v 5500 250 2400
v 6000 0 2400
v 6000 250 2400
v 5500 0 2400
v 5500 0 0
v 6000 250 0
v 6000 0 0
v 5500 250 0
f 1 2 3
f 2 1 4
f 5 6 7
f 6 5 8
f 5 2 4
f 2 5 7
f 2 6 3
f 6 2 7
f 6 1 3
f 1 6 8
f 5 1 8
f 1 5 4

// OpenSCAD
// file: tea_shop_parameters.scad
// =============================================================================
// Tea Shop — SHARED PARAMETERS (Base & Shell)
// -----------------------------------------------------------------------------
// OpenSCAD's native unit is 1 mm, so every value here is the REAL-LIFE size
// in millimetres (1000 mm = 1 m). E.g. building_width = 6000 means 6.0 m.
//
// For MLO / FiveM (which uses metres as 1 unit = 1 m), either:
//   (a) export each STL here and re-import at a scale of 0.001 (mm -> m), or
//   (b) model in metres directly by dividing every value below by 1000.
//
// Tune each value here; every module pulls its size from these variables.
// =============================================================================


// --- building shell / roof (lean-to: TALL back, SHORT front eave) -----------
wall_thickness    = 250;   // wall panel thickness                      (0.25 m)
building_width    = 6000;  // X extent, left wall -> right wall          (6.00 m)
building_depth    = 4000;  // Y extent, front eave -> back wall          (4.00 m)
back_height       = 3200;  // full wall height at the BACK (tall side)   (3.20 m)
front_eave_height = 2400;  // wall height at the FRONT eave (short side) (2.40 m)

// --- front wall openings (service window + door), measured along X ----------
left_pier_width   = 600;   // solid pier left of the service window      (0.60 m)
window_width      = 3400;  // service window opening width — made WIDE   (3.40 m)
mid_pier_width    = 500;   // solid pier between window and door         (0.50 m)
door_width        = 1000;  // door opening width                         (1.00 m)
sill_height       = 900;   // knee-wall (sill) height beneath the window (0.90 m)

// --- base slab / plinth ------------------------------------------------------
base_thickness    = 200;   // vertical thickness of the ground plinth    (0.20 m)
base_side_margin  = 900;   // slab overhang beyond left/right walls      (0.90 m)
base_back_margin  = 600;   // slab overhang behind the back wall         (0.60 m)
base_front_margin = 3000;  // extra slab in FRONT = porch/patio (pergola)(3.00 m)


// -----------------------------------------------------------------------------
// DERIVED DIMENSIONS (do not edit — computed from the values above)
// -----------------------------------------------------------------------------

// front-wall pier chain, left -> right, must sum exactly to building_width
window_left      = left_pier_width;                    // X where the window starts
window_right     = window_left + window_width;         // X where the window ends
door_left        = window_right + mid_pier_width;      // X where the door starts
door_right       = door_left + door_width;             // X where the door ends
right_pier_width = building_width - door_right;        // fills the rest to the corner

// window opening rises from the top of the sill up to the front eave line
window_open_height = front_eave_height - sill_height;
// file: tea_shop_modules.scad
// =============================================================================
// Tea Shop — MODULE LIBRARY (Base & Shell)
// -----------------------------------------------------------------------------
// This file only DEFINES the parts (and the assemble() preview). It instantiates
// NO geometry on its own, so it can be include'd by the individual export files
// (part_*.scad) and by tea_shop_assemble.scad without producing duplicates.
//
// GLOBAL COORDINATE SYSTEM (shared by every piece — no per-part centering):
//   +X -> left -> right  (building WIDTH along X, left wall at X=0)
//   +Y -> front -> back  (building DEPTH along Y, front eave at Y=0)
//   +Z -> up             (ground/porch surface = Z=0)
//
//   Building footprint = [0..building_width] x [0..building_depth].
//   Roof = single-pitch lean-to: TALL at BACK (Y=depth), SHORT at FRONT (Y=0).
// =============================================================================

include <tea_shop_parameters.scad>;


// -----------------------------------------------------------------------------
// _trapezoid_prism — shared core for the two side walls. It draws the side
// elevation (depth x height) as a 2D polygon, then linear_extrude +
// rotate([0,-90,0]) stand it up so its thickness runs along X. The front edge
// (Y=0) is the short eave height and the back edge (Y=depth) is the full back
// height, so the top edge automatically matches the roof pitch. Result
// occupies X = [0 .. wall_thickness].
// -----------------------------------------------------------------------------
module _trapezoid_prism() {
    translate([wall_thickness, 0, 0])
        rotate([0, -90, 0])
            linear_extrude(height = wall_thickness)
                polygon(points = [
                    [0,                 0],               // front, ground
                    [0,                 building_depth],  // back,  ground
                    [back_height,       building_depth],  // back,  top (tall)
                    [front_eave_height, 0]                // front, top (eave)
                ]);
}


// =============================================================================
// base_slab — flat ground plinth. Extends past the building on all sides, with
// a generous margin up front to form the porch/patio where the bench / stools
// sit under the pergola. Top surface is the datum Z=0.
// =============================================================================
module base_slab() {
    translate([-base_side_margin, -base_front_margin, -base_thickness])
        cube([
            building_width + 2 * base_side_margin,                 // X
            building_depth + base_front_margin + base_back_margin, // Y
            base_thickness                                          // Z
        ]);
}


// =============================================================================
// back_wall — solid rectangular panel, full building width and FULL height
// (the tall side of the lean-to). Sits at the back edge of the footprint.
// =============================================================================
module back_wall() {
    translate([0, building_depth - wall_thickness, 0])
        cube([building_width, wall_thickness, back_height]);
}


// =============================================================================
// left_side_wall — trapezoidal panel, TALL at the back edge and SHORT at the
// front edge, matching the roof slope. Occupies X = [0 .. wall_thickness].
// =============================================================================
module left_side_wall() {
    _trapezoid_prism();
}


// =============================================================================
// right_side_wall — mirror image of the left wall (identical trapezoid cross
// section, since both walls slope down toward the FRONT eave), placed at the
// right edge X = [building_width - wall_thickness .. building_width].
// Plain — no openings.
// =============================================================================
module right_side_wall() {
    translate([building_width - wall_thickness, 0, 0])
        _trapezoid_prism();
}


// =============================================================================
// FRONT WALL — broken into solid piers + a knee-wall (sill), leaving a service
// window opening and a door opening. Every front piece tops out at the front
// eave height (the horizontal line where the roof meets the front wall).
//
//   |<- left ->|<--- window --->|<- mid ->|<-- door -->|<- right ->|
//   |   pier   |    (opening)   |   pier  |  (opening)  |   pier   |
//   |          |   [sill below] |         |             |          |
// =============================================================================

// front_wall_left_pier — solid pier left of the service window, ground to eave.
module front_wall_left_pier() {
    translate([0, 0, 0])
        cube([left_pier_width, wall_thickness, front_eave_height]);
}


// front_wall_sill — the low knee-wall beneath the service window opening.
// The window opening sits above it.
// TODO: counter + window frame modules slot in above this sill (later group).
module front_wall_sill() {
    translate([window_left, 0, 0])
        cube([window_width, wall_thickness, sill_height]);
}


// front_wall_mid_pier — solid pier between the window and the door, full height.
module front_wall_mid_pier() {
    translate([window_right, 0, 0])
        cube([mid_pier_width, wall_thickness, front_eave_height]);
}


// front_wall_right_pier — solid pier right of the door, out to the front corner.
// Width is derived so the pier chain always ends flush with the right corner.
module front_wall_right_pier() {
    translate([door_right, 0, 0])
        cube([right_pier_width, wall_thickness, front_eave_height]);
}


// -----------------------------------------------------------------------------
// OPENING ANNOTATIONS (for reference — these are EMPTY volumes in the shell):
//
//   Service window opening:
//     X = [window_left .. window_right], Z = [sill_height .. front_eave_height]
//     TODO: window frame + service counter modules slot in here (later group).
//
//   Door opening:
//     X = [door_left .. door_right], Z = [0 .. front_eave_height] (full height)
//     TODO: door / door-frame module slots in here (later group).
// -----------------------------------------------------------------------------


// =============================================================================
// assemble — visual verification ONLY (not for export). Shows every piece in
// the shared coordinate system, each in its own colour, so the assembled shell
// can be checked against the reference before exporting individual STLs.
// =============================================================================
module assemble() {
    color("LightGray")  base_slab();

    color("SkyBlue")    back_wall();
    color("Orange")     left_side_wall();
    color("Orange")     right_side_wall();

    color("FireBrick")  front_wall_left_pier();
    color("Peru")       front_wall_sill();
    color("FireBrick")  front_wall_mid_pier();
    color("FireBrick")  front_wall_right_pier();
}
// main file
// =============================================================================
// part_front_wall_right_pier.scad — export the FRONT WALL RIGHT PIER only.
// Open this file, press F6 (render), then export as STL. Everything sits in the
// shared global coordinate system, so re-importing all parts together lines up
// automatically with no manual repositioning.
// =============================================================================

include <tea_shop_modules.scad>;

front_wall_right_pier();
